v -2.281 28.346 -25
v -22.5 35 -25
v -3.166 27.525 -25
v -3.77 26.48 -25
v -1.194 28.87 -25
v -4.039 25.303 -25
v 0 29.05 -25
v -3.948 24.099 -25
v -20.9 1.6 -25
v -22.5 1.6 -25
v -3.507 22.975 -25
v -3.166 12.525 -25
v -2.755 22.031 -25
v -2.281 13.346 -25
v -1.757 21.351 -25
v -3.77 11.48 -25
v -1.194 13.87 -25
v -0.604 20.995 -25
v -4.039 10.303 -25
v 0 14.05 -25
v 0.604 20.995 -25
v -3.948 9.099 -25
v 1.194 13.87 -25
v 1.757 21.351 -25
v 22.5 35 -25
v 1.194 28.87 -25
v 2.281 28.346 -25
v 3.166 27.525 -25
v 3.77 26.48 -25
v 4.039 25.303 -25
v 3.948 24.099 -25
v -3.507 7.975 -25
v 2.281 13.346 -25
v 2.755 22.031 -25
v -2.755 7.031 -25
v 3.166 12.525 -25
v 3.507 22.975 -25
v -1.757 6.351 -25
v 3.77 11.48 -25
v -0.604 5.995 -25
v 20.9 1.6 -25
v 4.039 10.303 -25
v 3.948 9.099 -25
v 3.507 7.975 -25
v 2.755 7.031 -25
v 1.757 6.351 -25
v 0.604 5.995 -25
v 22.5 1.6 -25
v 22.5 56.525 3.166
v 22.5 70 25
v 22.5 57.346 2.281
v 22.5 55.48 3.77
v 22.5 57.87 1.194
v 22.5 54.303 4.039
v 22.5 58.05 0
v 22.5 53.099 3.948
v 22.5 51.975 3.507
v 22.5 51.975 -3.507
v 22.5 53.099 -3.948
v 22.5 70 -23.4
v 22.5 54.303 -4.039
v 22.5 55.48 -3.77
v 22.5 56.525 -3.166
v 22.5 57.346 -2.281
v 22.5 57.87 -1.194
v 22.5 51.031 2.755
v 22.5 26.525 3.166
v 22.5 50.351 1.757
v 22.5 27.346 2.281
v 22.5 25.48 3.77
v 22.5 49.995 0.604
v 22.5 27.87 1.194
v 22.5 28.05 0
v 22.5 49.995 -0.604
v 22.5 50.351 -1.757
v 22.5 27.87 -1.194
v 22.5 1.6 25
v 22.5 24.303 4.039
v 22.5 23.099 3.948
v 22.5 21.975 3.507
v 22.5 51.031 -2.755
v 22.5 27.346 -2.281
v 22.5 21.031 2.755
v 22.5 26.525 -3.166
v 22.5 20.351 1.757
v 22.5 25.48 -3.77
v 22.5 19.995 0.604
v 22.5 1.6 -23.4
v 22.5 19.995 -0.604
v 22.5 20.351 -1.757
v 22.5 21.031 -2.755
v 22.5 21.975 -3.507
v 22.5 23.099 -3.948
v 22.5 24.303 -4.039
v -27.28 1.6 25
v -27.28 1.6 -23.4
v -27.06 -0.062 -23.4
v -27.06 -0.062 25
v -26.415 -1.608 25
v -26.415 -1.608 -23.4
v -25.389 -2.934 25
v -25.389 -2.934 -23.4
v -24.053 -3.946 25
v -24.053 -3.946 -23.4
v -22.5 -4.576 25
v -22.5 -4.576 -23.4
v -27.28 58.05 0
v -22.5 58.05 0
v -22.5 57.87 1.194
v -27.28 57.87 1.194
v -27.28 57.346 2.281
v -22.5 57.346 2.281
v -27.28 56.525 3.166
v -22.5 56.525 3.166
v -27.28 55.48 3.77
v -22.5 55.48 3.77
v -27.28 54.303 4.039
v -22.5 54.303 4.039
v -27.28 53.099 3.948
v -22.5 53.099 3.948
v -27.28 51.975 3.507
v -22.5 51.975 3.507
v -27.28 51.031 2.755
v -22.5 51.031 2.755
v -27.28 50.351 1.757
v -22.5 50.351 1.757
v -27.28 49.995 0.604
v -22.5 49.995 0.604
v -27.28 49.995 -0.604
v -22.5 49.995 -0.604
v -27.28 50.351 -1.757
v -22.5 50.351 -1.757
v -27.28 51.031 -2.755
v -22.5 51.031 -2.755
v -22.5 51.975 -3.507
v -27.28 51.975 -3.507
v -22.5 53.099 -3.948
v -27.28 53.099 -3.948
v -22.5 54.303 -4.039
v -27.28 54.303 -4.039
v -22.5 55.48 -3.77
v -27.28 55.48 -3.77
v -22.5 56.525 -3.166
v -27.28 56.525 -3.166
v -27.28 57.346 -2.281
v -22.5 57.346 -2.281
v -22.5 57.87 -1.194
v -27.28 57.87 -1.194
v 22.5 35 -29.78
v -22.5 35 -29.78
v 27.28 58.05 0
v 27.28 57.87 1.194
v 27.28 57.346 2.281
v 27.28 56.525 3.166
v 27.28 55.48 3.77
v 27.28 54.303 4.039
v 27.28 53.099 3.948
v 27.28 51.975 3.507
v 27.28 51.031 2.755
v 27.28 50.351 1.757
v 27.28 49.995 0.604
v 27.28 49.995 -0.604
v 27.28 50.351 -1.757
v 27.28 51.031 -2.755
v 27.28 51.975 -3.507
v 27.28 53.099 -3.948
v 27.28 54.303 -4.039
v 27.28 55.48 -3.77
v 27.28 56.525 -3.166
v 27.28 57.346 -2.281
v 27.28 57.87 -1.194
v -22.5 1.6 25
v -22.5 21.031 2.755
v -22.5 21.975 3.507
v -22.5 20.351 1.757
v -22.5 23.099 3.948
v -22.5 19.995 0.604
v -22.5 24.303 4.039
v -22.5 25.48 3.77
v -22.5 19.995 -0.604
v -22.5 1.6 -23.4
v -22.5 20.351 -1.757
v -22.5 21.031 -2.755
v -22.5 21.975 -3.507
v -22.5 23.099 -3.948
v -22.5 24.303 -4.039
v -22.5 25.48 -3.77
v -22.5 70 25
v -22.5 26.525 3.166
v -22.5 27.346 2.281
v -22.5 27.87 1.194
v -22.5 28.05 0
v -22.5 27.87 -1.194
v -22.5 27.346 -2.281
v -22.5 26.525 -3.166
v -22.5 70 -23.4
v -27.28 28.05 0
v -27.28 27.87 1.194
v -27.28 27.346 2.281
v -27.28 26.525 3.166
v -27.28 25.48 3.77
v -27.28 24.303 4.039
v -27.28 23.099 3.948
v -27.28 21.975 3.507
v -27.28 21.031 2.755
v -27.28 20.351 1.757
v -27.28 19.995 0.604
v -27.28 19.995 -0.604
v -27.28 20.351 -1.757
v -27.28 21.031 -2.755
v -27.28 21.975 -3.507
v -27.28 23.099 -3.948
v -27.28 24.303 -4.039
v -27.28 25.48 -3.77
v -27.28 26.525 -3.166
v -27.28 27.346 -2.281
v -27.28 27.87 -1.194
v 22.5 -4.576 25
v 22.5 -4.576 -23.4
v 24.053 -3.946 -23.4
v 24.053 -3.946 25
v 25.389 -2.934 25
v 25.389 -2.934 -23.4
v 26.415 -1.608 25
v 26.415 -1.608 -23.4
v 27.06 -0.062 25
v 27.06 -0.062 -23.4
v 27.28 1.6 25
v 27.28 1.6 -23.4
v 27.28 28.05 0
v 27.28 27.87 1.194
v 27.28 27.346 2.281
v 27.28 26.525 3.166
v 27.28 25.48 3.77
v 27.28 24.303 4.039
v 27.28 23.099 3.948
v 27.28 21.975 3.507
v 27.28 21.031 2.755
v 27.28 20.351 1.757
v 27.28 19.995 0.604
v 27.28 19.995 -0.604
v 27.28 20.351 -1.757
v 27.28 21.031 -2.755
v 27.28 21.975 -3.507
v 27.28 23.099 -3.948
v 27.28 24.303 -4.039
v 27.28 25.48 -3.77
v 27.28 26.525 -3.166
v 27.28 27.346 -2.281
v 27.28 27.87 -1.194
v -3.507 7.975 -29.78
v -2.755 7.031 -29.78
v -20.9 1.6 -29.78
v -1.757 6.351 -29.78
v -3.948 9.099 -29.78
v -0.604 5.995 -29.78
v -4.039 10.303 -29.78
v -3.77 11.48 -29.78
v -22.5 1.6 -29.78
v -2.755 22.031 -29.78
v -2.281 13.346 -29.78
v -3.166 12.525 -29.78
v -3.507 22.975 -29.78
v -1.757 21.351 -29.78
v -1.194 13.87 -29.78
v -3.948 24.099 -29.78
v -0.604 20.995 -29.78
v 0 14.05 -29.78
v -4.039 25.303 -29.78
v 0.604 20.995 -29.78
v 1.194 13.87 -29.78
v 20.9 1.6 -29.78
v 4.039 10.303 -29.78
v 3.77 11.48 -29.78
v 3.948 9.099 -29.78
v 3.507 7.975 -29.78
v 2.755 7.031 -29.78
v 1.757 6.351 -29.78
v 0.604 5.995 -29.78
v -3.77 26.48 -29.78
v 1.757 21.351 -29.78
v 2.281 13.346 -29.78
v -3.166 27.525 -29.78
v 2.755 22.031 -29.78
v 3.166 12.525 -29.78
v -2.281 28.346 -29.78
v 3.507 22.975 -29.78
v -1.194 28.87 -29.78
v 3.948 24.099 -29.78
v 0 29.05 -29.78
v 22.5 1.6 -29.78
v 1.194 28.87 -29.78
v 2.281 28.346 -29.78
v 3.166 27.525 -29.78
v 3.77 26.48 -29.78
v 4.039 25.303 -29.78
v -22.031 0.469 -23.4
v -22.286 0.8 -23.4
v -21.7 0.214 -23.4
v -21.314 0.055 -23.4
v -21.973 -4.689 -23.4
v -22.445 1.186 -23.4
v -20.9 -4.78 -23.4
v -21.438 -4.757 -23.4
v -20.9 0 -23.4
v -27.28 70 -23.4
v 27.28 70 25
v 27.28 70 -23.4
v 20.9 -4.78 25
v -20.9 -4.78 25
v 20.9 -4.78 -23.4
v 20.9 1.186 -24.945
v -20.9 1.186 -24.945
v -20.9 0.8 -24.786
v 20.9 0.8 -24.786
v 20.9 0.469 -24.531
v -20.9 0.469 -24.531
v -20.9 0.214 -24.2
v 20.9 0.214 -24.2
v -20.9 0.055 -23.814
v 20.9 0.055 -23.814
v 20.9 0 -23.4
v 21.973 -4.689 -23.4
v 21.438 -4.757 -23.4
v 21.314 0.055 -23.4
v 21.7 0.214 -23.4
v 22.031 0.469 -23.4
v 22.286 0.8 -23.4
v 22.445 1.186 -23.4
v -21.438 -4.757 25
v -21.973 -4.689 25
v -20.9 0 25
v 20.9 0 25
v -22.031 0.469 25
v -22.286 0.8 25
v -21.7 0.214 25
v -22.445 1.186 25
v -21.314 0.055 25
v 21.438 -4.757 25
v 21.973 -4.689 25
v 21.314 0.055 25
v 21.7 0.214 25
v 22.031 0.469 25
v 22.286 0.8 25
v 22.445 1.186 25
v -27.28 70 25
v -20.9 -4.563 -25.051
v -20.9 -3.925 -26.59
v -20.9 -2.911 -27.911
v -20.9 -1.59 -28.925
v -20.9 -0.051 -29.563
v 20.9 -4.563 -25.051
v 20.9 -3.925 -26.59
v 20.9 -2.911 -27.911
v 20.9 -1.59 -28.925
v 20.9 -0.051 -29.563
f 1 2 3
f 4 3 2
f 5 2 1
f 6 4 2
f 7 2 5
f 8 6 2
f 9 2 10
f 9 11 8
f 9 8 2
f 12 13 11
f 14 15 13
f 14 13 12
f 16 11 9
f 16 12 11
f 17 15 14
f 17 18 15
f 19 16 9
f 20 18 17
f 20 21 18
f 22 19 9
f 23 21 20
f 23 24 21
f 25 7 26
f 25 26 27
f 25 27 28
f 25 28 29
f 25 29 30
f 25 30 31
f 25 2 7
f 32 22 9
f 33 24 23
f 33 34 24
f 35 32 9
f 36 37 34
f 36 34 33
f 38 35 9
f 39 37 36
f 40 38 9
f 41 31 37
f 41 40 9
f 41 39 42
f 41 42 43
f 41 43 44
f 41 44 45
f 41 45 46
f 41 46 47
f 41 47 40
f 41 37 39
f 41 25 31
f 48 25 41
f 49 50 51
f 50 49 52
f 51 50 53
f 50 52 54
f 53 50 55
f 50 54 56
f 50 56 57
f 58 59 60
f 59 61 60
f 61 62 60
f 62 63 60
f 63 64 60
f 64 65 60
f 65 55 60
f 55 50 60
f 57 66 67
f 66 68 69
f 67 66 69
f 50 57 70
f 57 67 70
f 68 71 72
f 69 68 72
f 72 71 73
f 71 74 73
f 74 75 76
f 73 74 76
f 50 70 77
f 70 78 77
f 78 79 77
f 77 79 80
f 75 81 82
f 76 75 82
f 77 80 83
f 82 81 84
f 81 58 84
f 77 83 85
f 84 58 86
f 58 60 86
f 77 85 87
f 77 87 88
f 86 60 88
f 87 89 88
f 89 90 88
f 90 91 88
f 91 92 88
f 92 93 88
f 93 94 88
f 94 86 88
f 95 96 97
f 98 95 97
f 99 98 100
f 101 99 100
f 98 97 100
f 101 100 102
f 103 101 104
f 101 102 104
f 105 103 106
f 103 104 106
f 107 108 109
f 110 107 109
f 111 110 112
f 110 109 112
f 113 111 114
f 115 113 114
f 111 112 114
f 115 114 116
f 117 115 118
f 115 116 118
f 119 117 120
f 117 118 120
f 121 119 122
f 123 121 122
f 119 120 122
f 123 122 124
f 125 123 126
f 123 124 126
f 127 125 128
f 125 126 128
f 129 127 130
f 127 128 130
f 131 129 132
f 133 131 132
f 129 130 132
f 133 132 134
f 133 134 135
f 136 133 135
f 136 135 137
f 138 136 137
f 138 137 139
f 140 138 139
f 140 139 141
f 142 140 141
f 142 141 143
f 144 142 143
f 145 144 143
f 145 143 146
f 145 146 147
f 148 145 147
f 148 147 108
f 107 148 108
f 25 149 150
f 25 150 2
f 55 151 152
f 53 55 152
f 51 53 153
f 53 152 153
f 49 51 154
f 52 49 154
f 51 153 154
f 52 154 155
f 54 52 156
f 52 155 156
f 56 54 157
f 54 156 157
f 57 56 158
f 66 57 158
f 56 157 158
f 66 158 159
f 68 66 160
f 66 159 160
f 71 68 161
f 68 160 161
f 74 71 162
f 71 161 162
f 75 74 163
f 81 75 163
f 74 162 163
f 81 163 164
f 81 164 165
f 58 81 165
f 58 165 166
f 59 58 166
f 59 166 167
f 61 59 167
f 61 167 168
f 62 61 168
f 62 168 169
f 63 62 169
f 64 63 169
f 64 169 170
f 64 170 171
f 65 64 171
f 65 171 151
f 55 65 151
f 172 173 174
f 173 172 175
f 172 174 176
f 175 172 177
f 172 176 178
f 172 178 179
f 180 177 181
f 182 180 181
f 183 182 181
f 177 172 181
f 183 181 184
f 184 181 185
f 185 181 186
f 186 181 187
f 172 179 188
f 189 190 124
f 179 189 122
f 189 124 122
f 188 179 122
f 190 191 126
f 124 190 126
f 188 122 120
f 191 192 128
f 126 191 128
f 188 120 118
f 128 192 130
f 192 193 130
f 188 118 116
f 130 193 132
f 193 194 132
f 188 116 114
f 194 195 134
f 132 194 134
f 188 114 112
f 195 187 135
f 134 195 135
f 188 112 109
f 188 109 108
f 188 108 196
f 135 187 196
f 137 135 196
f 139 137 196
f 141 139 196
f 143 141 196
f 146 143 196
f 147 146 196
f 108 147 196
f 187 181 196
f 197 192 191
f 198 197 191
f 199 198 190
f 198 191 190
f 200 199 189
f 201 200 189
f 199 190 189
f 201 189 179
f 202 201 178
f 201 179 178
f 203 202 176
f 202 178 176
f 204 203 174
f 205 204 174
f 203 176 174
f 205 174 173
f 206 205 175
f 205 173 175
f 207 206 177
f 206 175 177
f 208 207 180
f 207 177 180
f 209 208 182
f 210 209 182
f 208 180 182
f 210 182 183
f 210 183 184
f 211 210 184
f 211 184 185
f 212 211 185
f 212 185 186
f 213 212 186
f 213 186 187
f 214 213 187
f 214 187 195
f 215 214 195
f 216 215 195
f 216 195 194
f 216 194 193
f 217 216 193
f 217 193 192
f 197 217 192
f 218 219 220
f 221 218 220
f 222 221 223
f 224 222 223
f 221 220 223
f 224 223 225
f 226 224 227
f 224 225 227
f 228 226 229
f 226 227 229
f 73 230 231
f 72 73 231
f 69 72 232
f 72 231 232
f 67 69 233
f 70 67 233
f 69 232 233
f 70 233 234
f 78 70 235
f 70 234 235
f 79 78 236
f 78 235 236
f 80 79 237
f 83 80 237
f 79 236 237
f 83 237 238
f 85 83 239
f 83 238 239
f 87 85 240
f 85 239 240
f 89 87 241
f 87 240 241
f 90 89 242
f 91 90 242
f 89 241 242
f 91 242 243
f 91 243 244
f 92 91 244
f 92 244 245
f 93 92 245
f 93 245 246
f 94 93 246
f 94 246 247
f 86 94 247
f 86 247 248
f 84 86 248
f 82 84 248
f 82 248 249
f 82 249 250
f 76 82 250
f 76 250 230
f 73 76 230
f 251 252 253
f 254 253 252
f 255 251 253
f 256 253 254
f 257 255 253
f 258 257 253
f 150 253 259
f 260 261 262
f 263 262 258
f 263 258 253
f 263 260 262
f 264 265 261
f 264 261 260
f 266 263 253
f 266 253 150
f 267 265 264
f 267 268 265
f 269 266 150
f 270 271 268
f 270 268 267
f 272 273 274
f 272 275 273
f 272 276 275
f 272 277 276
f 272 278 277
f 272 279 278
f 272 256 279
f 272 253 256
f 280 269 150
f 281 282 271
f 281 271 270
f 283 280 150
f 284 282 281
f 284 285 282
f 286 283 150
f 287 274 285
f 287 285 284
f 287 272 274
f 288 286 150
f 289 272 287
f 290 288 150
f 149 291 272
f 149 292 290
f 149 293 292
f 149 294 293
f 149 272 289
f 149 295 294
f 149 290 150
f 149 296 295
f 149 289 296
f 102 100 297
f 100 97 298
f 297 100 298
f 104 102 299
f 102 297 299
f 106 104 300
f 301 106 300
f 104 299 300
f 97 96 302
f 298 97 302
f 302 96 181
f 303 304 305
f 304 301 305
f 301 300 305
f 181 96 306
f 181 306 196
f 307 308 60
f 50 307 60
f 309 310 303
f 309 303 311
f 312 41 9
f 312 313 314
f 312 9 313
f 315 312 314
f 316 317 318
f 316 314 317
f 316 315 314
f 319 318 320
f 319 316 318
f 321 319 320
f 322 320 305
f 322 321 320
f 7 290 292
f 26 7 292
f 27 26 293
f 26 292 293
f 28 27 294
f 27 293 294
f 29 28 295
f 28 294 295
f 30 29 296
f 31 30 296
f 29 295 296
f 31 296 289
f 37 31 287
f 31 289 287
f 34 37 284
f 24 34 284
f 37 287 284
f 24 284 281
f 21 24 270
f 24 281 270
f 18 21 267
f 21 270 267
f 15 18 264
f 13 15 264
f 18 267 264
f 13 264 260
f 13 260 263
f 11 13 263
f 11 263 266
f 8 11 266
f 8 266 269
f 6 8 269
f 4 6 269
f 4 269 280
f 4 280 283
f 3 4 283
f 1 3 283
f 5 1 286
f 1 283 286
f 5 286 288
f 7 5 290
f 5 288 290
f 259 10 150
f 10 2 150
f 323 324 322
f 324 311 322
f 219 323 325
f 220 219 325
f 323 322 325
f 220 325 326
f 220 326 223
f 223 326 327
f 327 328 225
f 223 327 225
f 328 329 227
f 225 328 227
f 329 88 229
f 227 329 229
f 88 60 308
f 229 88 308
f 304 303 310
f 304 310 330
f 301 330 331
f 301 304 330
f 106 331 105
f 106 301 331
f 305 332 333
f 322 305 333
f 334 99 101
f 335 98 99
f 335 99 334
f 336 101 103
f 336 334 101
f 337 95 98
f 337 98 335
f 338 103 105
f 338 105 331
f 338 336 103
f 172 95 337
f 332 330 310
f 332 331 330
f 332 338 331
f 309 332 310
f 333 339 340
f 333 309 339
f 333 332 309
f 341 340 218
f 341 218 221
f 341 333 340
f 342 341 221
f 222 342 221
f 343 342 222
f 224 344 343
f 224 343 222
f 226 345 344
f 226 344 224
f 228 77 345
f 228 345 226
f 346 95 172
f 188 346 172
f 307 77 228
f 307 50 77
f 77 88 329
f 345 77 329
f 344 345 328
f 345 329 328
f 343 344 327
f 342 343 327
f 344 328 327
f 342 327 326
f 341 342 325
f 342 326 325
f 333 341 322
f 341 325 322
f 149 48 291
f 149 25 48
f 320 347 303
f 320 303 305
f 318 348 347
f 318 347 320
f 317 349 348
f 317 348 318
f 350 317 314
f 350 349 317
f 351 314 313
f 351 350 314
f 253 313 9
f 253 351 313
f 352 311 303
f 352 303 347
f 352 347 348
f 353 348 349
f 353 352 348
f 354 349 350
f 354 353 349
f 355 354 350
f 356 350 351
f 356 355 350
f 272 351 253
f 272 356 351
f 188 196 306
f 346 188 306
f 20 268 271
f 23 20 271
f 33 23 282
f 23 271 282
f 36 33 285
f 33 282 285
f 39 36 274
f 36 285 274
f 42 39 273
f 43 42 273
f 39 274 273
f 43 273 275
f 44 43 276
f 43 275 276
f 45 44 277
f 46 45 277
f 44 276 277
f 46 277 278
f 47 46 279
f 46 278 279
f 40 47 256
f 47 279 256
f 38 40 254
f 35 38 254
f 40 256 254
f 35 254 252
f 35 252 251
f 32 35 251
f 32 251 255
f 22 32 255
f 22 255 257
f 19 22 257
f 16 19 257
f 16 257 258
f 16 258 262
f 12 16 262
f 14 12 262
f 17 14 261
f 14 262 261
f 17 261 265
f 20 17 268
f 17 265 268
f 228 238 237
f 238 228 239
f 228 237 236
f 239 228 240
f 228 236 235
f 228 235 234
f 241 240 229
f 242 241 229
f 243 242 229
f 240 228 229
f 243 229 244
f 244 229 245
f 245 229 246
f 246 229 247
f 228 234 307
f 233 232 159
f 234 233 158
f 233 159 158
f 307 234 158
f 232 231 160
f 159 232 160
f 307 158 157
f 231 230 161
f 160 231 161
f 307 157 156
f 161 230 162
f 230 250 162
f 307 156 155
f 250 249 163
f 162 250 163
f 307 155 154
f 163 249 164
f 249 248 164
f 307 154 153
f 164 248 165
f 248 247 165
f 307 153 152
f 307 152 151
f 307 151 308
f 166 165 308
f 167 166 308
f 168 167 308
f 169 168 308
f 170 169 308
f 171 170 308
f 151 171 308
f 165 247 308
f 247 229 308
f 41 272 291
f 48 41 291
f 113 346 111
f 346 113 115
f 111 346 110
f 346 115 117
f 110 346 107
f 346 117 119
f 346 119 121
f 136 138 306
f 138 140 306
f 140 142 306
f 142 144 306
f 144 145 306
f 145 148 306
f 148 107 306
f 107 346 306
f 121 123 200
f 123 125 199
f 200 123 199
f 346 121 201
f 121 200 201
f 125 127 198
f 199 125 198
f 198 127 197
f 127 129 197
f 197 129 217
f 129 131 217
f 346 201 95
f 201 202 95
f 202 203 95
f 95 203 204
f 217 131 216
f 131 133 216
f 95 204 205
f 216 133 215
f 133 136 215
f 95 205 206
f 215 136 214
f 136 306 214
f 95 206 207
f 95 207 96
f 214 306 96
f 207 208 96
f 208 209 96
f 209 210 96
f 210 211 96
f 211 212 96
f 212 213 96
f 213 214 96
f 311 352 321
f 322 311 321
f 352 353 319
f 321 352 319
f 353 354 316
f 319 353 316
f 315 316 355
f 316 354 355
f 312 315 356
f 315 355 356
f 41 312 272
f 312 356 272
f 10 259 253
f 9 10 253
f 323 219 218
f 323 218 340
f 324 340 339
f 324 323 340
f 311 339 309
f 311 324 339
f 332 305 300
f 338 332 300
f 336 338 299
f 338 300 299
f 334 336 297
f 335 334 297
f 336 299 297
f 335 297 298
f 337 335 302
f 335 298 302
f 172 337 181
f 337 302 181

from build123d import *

# Parameters (mm, degrees)
SKETCH2_W                    = 45
SKETCH2_H                    = 50
BASE_FLANGE1_DEPTH           = 4.78
EDGE_FLANGE1_STRIP_W         = 22.32
EDGE_FLANGE1_STRIP_H         = 4.78
EDGE_FLANGE1_STRIP_CUT_DEPTH = 45
EDGE_FLANGE1_DEPTH           = 45
EDGE_FLANGE2_START           = -29.78
EDGE_FLANGE2_OUTLINE_W       = 1.6
EDGE_FLANGE2_OUTLINE_H       = 6.38
EDGE_FLANGE2_DEPTH           = 6.38
EDGE_FLANGE2_START_2         = -23.4
EDGE_FLANGE2_2_DEPTH         = 48.4
EDGE_FLANGE2_3_DEPTH         = 48.4
CUT_EXTRUDE1_REACH           = 95.614
SKETCH23_R                   = 4.05
SKETCH24_R                   = 4.05
CUT_EXTRUDE2_DEPTH           = 4.78


# Read off the part's stored shape, not the designer's step: Edge-Flange2
# Sheet-metal steps are written as plain solids
with BuildPart() as part:
    # Sketch2 → Base-Flange1 (new body)
    with BuildSketch(Plane(origin=(0, 0, 0), x_dir=(1, 0, 0), z_dir=(0, 1, 0))):
        Rectangle(SKETCH2_W, SKETCH2_H)
    extrude(amount=-BASE_FLANGE1_DEPTH)

    # Edge-Flange1 strip (across the edge) → Edge-Flange1 strip cut (cut)
    with BuildSketch(Plane(origin=(22.5, 0, -25), x_dir=(0, 0, 1), z_dir=(-1, 0, 0))):
        with Locations((-9.56, -2.39)):
            Rectangle(EDGE_FLANGE1_STRIP_W, EDGE_FLANGE1_STRIP_H)
    extrude(amount=EDGE_FLANGE1_STRIP_CUT_DEPTH, mode=Mode.SUBTRACT)

    # Edge-Flange1 section (across the edge) → Edge-Flange1 (add)
    with BuildSketch(Plane(origin=(22.5, 0, -25), x_dir=(0, 0, 1), z_dir=(-1, 0, 0))):
        with BuildLine():
            Line((-4.78, 1.6), (-4.78, 35))
            Line((-4.78, 35), (0, 35))
            Line((0, 35), (0, 1.6))
            ThreePointArc((0, 1.6), (0.46862915, 0.46862915), (1.6, 0))
            Line((1.6, 0), (1.6, -4.78))
            ThreePointArc((1.6, -4.78), (-2.911341264, -2.911341264), (-4.78, 1.6))
        make_face()
    extrude(amount=EDGE_FLANGE1_DEPTH)

    # Edge-Flange2 outline → Edge-Flange2 (cut)
    with BuildSketch(Plane.XY.offset(EDGE_FLANGE2_START)):
        with Locations((-21.7, -1.59)):
            Rectangle(EDGE_FLANGE2_OUTLINE_W, EDGE_FLANGE2_OUTLINE_H)
        with Locations((21.7, -1.59)):
            Rectangle(EDGE_FLANGE2_OUTLINE_W, EDGE_FLANGE2_OUTLINE_H)
    extrude(amount=EDGE_FLANGE2_DEPTH, mode=Mode.SUBTRACT)

    # Edge-Flange2 2 outline → Edge-Flange2 2 (cut)
    with BuildSketch(Plane.XY.offset(EDGE_FLANGE2_START_2)):
        with BuildLine():
            Line((-22.5, -4.78), (-20.9, -4.78))
            ThreePointArc((-20.9, -4.78), (-21.706468998, -4.728823568), (-22.5, -4.576115284))
            Line((-22.5, -4.576115284), (-22.5, -4.78))
        make_face()
        with BuildLine():
            ThreePointArc((22.5, -4.576115284), (21.706468998, -4.728823568), (20.9, -4.78))
            Line((20.9, -4.78), (22.5, -4.78))
            Line((22.5, -4.78), (22.5, -4.576115284))
        make_face()
    extrude(amount=EDGE_FLANGE2_2_DEPTH, mode=Mode.SUBTRACT)

    # Edge-Flange2 3 outline → Edge-Flange2 3 (add)
    with BuildSketch(Plane.XY.offset(EDGE_FLANGE2_START_2)):
        with BuildLine():
            Line((-22.5, -4.576115284), (-22.5, 0))
            Line((-22.5, 0), (-20.9, 0))
            ThreePointArc((-20.9, 0), (-22.03137085, 0.46862915), (-22.5, 1.6))
            Line((-22.5, 1.6), (-22.5, 70))
            Line((-22.5, 70), (-27.28, 70))
            Line((-27.28, 70), (-27.28, 1.6))
            ThreePointArc((-27.28, 1.6), (-25.945413759, -2.304894365), (-22.5, -4.576115284))
        make_face()
        with BuildLine():
            ThreePointArc((22.5, 1.6), (22.03137085, 0.46862915), (20.9, 0))
            Line((20.9, 0), (22.5, 0))
            Line((22.5, 0), (22.5, -4.576115284))
            ThreePointArc((22.5, -4.576115284), (25.945413759, -2.304894365), (27.28, 1.6))
            Line((27.28, 1.6), (27.28, 70))
            Line((27.28, 70), (22.5, 70))
            Line((22.5, 70), (22.5, 1.6))
        make_face()
    extrude(amount=EDGE_FLANGE2_3_DEPTH)

    # Cut-Extrude1: up to this face of the body (flat: up to its plane)
    cut_extrude1_end = Plane(part.part.faces().sort_by_distance((-27.28, 35.8, 0.8))[0])
    # Sketch23 → Cut-Extrude1 (cut, up to the picked face)
    with BuildSketch(Plane(origin=(27.28, 0, 0), x_dir=(0, 0, -1), z_dir=(1, 0, 0)), mode=Mode.PRIVATE) as cut_extrude1_sk1:
        with Locations(Location((0, 54, 0), (0, 0, 90))):
            Circle(SKETCH23_R)
    cut_extrude1_tool1 = split(extrude(cut_extrude1_sk1.sketch, amount=-CUT_EXTRUDE1_REACH, mode=Mode.PRIVATE), bisect_by=cut_extrude1_end, keep=Keep.BOTH, mode=Mode.PRIVATE)
    # Sketch23 → Cut-Extrude1 (cut, up to the picked face)
    with BuildSketch(Plane(origin=(27.28, 0, 0), x_dir=(0, 0, -1), z_dir=(1, 0, 0)), mode=Mode.PRIVATE) as cut_extrude1_sk2:
        with Locations(Location((0, 24, 0), (0, 0, 90))):
            Circle(SKETCH23_R)
    cut_extrude1_tool2 = split(extrude(cut_extrude1_sk2.sketch, amount=-CUT_EXTRUDE1_REACH, mode=Mode.PRIVATE), bisect_by=cut_extrude1_end, keep=Keep.BOTH, mode=Mode.PRIVATE)
    add(cut_extrude1_tool1.solids().sort_by(Axis((27.28, 54, 0), (-1, 0, 0)))[0], mode=Mode.SUBTRACT)
    add(cut_extrude1_tool2.solids().sort_by(Axis((27.28, 24, 0), (-1, 0, 0)))[0], mode=Mode.SUBTRACT)

    # Sketch24 → Cut-Extrude2 (cut)
    with BuildSketch(Plane(origin=(0, 0, -29.78), x_dir=(-1, 0, 0), z_dir=(0, 0, -1))):
        with Locations(Location((0, 25, 0), (0, 0, 90))):
            Circle(SKETCH24_R)
        with Locations(Location((0, 10, 0), (0, 0, 90))):
            Circle(SKETCH24_R)
    extrude(amount=-CUT_EXTRUDE2_DEPTH, mode=Mode.SUBTRACT)


solid = part.part
